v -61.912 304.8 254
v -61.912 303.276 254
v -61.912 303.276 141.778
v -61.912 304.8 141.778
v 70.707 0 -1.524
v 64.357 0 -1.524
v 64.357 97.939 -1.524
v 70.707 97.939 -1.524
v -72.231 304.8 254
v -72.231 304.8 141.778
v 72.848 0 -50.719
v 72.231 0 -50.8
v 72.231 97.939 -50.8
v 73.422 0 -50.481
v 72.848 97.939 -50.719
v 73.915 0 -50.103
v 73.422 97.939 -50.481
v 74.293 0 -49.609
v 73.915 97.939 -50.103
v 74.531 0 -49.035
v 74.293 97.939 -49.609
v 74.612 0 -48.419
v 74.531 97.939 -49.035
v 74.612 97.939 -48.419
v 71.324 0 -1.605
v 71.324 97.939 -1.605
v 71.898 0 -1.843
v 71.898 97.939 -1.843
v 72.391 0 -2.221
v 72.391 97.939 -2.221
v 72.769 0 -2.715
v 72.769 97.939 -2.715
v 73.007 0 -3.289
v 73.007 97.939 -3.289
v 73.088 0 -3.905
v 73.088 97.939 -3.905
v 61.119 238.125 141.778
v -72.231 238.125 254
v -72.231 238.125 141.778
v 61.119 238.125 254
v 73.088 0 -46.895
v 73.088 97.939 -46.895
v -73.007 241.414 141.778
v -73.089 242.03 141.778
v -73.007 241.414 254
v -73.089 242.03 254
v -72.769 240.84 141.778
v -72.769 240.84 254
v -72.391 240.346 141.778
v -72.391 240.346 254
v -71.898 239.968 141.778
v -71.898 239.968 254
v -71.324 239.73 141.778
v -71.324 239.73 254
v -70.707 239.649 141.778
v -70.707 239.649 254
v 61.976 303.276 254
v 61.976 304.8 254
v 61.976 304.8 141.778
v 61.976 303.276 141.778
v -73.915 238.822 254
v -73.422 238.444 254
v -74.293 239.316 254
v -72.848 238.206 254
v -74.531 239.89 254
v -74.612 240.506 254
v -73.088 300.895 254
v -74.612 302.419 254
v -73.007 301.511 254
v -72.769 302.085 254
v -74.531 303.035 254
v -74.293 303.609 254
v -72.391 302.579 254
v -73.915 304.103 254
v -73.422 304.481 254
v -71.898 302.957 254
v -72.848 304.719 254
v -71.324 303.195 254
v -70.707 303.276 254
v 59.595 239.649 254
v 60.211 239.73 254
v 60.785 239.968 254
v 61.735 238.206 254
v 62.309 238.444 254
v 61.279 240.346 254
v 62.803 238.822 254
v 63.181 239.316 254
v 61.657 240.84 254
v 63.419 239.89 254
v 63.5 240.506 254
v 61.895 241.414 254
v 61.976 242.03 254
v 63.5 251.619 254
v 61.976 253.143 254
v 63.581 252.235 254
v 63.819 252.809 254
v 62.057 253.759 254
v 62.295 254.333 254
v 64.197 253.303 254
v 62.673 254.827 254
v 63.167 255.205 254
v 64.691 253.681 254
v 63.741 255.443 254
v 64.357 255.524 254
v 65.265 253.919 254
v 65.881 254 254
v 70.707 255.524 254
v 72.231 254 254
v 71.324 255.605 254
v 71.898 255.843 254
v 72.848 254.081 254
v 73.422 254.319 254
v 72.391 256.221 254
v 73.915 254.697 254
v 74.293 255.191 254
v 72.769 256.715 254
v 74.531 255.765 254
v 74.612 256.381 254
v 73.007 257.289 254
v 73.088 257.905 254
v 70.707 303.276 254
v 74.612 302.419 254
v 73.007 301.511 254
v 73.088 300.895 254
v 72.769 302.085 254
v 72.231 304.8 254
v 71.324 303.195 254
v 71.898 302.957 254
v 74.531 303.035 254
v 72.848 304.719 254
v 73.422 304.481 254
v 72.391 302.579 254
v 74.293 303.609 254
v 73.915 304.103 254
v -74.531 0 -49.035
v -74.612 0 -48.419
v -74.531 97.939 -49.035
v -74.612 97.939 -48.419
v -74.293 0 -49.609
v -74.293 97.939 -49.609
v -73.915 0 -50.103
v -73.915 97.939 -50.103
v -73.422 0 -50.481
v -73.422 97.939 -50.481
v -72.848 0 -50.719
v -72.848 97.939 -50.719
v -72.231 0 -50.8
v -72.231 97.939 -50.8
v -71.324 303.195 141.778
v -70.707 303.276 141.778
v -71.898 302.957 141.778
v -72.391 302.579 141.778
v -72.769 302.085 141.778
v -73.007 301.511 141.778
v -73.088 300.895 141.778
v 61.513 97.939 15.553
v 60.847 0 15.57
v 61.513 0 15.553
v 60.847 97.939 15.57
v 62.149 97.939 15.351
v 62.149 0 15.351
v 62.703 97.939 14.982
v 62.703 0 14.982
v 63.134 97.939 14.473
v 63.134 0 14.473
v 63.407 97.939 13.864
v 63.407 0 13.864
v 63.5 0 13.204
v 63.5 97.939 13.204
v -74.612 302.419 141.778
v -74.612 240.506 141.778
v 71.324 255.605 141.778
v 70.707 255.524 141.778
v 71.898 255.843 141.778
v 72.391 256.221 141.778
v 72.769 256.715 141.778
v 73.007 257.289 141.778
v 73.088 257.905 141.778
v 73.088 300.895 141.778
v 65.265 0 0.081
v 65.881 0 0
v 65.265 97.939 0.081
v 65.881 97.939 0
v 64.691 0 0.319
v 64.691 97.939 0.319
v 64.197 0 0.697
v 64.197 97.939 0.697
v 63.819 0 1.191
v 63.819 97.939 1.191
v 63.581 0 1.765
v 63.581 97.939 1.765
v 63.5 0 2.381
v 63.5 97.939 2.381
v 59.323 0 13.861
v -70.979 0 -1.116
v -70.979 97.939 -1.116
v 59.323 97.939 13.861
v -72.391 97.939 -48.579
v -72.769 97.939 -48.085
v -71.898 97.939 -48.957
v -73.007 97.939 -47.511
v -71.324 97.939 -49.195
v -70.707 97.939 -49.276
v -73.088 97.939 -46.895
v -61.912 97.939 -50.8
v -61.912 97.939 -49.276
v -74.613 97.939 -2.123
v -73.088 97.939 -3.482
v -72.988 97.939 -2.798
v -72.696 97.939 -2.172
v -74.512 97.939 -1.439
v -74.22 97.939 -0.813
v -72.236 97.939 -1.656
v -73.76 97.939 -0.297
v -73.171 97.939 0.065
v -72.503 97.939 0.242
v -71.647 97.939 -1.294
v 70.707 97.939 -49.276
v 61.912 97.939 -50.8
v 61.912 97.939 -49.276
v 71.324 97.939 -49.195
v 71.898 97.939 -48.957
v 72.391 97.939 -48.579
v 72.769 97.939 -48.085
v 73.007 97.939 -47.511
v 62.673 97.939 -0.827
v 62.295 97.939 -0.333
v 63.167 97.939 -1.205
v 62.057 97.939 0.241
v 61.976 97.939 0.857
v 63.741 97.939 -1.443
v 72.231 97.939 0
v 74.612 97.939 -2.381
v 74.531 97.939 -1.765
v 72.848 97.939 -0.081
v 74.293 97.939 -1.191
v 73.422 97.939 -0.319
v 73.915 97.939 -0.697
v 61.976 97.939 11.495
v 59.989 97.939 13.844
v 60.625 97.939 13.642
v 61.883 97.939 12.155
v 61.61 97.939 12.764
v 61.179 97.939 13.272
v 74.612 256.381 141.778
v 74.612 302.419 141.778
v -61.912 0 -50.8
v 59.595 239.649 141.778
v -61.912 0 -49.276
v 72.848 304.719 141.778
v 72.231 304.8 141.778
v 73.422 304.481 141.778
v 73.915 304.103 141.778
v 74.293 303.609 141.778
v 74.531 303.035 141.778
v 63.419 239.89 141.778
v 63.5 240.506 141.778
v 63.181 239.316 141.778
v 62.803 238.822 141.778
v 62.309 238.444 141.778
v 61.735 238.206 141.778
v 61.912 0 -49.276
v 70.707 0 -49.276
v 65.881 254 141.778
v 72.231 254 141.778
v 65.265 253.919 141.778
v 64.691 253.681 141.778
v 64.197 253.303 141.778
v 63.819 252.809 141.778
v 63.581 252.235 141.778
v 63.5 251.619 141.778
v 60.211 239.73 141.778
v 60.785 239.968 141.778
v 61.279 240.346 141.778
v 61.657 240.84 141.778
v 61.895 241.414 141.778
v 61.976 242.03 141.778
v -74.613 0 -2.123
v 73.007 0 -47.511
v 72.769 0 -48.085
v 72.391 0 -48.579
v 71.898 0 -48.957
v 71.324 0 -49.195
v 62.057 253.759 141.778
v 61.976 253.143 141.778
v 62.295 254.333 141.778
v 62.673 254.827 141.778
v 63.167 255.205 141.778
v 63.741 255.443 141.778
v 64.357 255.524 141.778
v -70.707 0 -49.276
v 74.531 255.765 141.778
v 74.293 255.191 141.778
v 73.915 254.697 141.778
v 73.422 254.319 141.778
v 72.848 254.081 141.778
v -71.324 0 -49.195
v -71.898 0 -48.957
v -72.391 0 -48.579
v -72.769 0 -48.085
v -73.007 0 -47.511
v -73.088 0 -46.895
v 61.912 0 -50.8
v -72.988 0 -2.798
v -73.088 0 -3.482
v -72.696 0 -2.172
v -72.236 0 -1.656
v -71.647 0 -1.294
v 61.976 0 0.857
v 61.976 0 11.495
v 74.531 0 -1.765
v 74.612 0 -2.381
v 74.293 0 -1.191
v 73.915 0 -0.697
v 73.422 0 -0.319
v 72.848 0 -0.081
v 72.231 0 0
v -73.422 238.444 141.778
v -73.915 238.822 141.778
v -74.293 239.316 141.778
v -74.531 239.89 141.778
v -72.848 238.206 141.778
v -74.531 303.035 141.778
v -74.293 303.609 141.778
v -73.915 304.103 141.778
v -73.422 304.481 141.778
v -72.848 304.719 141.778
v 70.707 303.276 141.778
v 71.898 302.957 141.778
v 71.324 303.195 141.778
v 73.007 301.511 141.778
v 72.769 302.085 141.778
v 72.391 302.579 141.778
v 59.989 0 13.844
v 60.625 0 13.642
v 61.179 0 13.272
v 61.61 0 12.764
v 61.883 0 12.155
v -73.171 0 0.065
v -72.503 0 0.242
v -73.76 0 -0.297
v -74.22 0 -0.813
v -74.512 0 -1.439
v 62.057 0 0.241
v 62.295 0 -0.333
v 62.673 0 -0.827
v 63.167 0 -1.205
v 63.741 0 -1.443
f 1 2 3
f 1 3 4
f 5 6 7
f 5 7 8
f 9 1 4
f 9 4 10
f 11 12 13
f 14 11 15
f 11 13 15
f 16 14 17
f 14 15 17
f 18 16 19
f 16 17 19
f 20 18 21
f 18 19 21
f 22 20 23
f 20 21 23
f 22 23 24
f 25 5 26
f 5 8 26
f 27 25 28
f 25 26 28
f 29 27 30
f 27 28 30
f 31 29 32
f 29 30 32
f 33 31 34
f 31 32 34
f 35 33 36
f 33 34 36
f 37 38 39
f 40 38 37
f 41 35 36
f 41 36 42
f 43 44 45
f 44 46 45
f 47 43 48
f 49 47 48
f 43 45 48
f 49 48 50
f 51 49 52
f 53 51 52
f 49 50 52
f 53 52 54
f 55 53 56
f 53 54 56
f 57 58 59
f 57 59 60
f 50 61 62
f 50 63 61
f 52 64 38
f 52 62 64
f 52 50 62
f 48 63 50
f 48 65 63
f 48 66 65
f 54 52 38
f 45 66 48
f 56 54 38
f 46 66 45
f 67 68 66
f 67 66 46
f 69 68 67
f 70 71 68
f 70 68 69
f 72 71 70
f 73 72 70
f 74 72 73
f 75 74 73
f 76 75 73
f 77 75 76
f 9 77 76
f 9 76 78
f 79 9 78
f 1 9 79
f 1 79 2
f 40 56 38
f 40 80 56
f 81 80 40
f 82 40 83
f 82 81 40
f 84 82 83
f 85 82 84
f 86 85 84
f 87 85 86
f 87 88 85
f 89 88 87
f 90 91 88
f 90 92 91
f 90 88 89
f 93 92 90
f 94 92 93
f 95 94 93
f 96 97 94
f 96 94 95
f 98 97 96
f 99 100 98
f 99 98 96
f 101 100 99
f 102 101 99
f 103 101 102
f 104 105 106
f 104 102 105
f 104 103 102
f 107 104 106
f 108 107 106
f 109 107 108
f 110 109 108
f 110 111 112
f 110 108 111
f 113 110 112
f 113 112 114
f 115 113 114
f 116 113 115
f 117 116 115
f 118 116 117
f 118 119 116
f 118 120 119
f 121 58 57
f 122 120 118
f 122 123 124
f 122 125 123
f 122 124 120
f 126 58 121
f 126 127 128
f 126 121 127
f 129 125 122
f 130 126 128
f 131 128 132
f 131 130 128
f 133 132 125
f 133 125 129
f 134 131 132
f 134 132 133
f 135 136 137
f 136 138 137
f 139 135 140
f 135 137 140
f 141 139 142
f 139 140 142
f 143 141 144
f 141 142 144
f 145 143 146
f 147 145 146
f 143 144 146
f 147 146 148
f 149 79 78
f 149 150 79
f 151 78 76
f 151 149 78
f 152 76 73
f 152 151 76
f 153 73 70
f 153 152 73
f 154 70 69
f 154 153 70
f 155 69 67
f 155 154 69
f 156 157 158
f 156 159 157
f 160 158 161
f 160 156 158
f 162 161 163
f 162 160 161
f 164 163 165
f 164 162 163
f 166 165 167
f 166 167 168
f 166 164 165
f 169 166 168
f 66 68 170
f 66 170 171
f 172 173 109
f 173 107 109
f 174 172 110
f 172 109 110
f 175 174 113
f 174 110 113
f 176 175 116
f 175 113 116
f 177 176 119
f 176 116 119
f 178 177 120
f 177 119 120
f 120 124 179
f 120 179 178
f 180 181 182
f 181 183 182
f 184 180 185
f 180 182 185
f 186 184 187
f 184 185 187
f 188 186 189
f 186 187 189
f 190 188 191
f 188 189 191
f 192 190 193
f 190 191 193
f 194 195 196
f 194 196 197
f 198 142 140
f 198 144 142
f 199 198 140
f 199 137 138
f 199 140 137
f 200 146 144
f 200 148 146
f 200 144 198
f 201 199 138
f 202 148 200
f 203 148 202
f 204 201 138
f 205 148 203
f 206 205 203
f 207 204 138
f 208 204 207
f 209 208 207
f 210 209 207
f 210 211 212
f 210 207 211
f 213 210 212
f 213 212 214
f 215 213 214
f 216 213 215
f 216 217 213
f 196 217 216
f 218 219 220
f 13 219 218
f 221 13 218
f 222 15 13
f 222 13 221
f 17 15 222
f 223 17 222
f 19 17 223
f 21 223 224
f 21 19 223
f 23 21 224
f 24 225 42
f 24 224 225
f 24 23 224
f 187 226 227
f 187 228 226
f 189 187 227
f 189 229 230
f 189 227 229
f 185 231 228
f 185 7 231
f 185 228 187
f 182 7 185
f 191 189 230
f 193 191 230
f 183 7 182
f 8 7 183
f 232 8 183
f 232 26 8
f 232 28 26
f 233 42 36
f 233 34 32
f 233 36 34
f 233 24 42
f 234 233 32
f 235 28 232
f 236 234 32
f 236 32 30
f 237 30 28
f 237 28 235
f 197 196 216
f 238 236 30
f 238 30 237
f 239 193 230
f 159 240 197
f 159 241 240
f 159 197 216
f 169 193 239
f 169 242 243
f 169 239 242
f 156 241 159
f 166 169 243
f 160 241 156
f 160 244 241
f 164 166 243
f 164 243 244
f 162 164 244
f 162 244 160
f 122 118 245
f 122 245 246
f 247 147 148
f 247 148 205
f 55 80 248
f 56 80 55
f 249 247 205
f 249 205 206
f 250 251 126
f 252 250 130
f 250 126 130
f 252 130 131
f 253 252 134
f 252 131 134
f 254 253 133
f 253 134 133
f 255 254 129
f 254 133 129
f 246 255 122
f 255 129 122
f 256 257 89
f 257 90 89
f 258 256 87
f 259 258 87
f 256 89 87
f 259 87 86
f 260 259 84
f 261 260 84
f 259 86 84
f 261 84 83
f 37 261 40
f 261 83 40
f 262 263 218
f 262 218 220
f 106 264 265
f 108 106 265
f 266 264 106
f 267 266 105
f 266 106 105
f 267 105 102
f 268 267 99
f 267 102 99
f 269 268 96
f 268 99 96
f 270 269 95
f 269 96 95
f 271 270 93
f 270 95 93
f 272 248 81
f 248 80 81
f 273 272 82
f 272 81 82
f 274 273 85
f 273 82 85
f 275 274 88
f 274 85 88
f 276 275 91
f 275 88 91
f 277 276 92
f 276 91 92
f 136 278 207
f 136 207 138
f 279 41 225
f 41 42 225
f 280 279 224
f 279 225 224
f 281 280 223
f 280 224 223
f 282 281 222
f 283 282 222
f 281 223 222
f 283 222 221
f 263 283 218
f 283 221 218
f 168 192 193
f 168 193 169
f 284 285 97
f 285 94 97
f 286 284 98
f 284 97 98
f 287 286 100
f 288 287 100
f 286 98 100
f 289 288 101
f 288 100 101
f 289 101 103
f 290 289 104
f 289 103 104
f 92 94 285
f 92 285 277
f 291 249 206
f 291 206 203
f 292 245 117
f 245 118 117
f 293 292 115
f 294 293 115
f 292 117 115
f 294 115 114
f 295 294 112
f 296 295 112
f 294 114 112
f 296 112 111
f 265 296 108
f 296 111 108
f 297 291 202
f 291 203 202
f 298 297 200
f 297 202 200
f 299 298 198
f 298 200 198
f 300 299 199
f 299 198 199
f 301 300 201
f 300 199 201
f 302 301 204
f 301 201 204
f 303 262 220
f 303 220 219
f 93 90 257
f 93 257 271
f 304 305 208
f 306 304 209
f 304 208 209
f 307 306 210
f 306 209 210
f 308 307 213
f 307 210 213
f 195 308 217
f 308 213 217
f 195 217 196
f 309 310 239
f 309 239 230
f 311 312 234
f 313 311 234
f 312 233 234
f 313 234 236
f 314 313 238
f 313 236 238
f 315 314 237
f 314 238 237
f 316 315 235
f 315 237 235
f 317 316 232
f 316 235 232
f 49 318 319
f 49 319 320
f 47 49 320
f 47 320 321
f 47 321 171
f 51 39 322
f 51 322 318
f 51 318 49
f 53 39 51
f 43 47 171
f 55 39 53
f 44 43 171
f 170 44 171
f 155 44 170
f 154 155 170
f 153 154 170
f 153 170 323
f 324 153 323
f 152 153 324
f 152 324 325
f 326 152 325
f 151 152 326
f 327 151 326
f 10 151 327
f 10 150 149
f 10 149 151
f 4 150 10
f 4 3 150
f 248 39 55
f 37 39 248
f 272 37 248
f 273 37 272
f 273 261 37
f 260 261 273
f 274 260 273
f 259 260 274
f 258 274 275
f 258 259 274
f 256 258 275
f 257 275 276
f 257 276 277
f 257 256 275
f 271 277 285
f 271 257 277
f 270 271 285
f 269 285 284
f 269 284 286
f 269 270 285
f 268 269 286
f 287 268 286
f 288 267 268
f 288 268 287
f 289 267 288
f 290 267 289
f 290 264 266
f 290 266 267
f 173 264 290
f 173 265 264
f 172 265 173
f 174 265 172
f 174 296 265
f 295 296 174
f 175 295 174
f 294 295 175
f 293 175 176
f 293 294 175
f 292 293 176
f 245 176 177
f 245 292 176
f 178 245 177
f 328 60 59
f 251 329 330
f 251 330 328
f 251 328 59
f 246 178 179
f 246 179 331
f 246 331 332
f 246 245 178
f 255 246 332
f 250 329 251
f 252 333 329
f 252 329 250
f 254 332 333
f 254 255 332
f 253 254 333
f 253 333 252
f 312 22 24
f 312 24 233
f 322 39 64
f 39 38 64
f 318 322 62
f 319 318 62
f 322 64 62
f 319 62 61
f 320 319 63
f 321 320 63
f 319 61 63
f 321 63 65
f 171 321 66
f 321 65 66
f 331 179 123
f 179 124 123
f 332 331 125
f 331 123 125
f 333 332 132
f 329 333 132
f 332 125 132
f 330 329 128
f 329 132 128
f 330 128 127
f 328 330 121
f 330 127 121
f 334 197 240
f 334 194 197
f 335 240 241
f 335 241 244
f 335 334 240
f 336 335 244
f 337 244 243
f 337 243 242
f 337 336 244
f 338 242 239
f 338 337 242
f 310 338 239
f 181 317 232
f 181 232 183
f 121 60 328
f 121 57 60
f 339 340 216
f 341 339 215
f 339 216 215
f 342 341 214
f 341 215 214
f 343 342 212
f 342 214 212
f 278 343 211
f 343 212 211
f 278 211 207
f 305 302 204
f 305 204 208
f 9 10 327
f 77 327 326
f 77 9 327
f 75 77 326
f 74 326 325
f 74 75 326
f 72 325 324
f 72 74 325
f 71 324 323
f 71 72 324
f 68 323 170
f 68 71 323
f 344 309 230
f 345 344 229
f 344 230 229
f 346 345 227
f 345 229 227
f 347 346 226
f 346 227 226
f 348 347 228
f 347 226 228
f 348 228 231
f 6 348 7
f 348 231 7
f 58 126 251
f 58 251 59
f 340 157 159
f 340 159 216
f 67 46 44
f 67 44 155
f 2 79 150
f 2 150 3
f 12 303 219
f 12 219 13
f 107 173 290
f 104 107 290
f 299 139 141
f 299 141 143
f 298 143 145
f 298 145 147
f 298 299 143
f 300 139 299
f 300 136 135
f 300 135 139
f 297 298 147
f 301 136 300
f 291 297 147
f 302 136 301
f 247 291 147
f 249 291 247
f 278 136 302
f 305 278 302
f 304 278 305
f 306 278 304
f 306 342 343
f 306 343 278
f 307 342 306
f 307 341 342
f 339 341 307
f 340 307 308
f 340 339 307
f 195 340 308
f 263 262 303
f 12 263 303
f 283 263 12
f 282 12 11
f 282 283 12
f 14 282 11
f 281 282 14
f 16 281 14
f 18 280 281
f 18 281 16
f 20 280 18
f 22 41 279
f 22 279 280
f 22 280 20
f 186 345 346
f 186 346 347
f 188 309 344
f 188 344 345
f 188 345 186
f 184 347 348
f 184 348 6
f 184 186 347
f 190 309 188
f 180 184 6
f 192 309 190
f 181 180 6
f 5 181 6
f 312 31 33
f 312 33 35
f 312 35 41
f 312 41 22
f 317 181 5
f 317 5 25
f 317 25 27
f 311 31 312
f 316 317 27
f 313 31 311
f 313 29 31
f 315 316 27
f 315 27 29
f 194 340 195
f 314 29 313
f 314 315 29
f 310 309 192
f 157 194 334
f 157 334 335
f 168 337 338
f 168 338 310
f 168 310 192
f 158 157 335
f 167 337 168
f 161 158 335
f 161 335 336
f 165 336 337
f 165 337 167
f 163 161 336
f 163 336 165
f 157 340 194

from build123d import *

# Parameters (mm, degrees)
F1_DEPTH       = 304.8
F3_DEPTH       = 254
F3_DEPTH_BACK  = 50.8
F6_DEPTH       = 15.875
F8_DEPTH       = 66.676
F11_W          = 2.1258684099
F11_H          = 0.0508
F12_DEPTH      = 254.001
F13_W          = 299.0930452943
F13_H          = 280.027359724
F14_DEPTH      = 74.6135
F14_DEPTH_BACK = 74.6135
F15_R          = 2.38125
F16_R          = 2.38125


# Not quite as in the source:
# - a feature of the source that left no trace in its solid (it failed there, or was rolled back) is left out


with BuildPart() as f1:
    # F0 (on Front) → F1 (new body)
    with BuildSketch(Plane.XZ):
        Polygon((-74.6125, -50.8), (-61.9125, -50.8), (-61.9125, -49.276), (-73.0885, -49.276), (-73.0885, -1.3588619322), (61.976, 14.1657932403), (61.976, -1.524), (73.0885, -1.524), (73.0885, -49.276), (61.9125, -49.276), (61.9125, -50.8), (74.6125, -50.8), (74.6125, 0), (63.5, 0), (63.5, 15.875), (-74.6125, 0), align=None)
    extrude(amount=-F1_DEPTH)


with BuildPart() as f3:
    # F2 (on Top) → F3 (new body, two sides)
    with BuildSketch(Plane.XY) as f3_sk:
        Polygon((-61.9125, 304.8), (-74.6125, 304.8), (-74.6125, 238.125), (63.5, 238.125), (63.5, 254), (74.6125, 254), (74.6125, 304.8), (61.976, 304.8), (61.976, 303.276), (73.0885, 303.276), (73.0885, 255.524), (61.976, 255.524), (61.976, 239.649), (-73.0885, 239.649), (-73.0885, 303.276), (-61.9125, 303.276), align=None)
    extrude(amount=F3_DEPTH)
    extrude(f3_sk.sketch, amount=-F3_DEPTH_BACK)


with BuildPart() as f6_tool:
    # F5 (on face) → F6 (new body, through all)
    with BuildSketch(Plane.XZ.offset(-238.125)):
        Polygon((61.976, 14.1657932403), (-73.0885, -1.3588619322), (-91.1419016793, -3.4339655735), (-91.1419016793, -71.0971727967), (86.3244011998, -71.0971727967), (86.3244011998, 0), (61.976, 0), align=None)
    extrude(amount=-F6_DEPTH)


with BuildPart() as f1_1:
    add(f1.part)

    # F6: cut by f6_tool
    add(f6_tool.part, mode=Mode.SUBTRACT)


with BuildPart() as f3_1:
    add(f3.part)

    # F6: cut by f6_tool
    add(f6_tool.part, mode=Mode.SUBTRACT)


with BuildPart() as f8_tool:
    # F7 (on face) → F8 (new body, through all)
    with BuildSketch(Plane.XZ.offset(-238.125)):
        Polygon((-74.6125, 0), (-74.6125, -1.5340343459), (61.976, 14.1657932403), (61.976, 0), (63.5, 0), (63.5, 15.875), align=None)
    extrude(amount=-F8_DEPTH)


with BuildPart() as f1_2:
    add(f1_1.part)

    # F8: cut by f8_tool
    add(f8_tool.part, mode=Mode.SUBTRACT)


with BuildPart() as f3_2:
    add(f3_1.part)

    # F8: cut by f8_tool
    add(f8_tool.part, mode=Mode.SUBTRACT)


with BuildPart() as f1_3:
    add(f1_2.part)

    # F10: union F3
    add(f3_2.part)

    # F11 (on face) → F12 (cut, through all)
    with BuildSketch(Plane.XY):
        with Locations((62.4370657951, 238.0996)):
            Rectangle(F11_W, F11_H)
    extrude(amount=F12_DEPTH, mode=Mode.SUBTRACT)

    # F13 (on Right) → F14 (cut, two sides)
    with BuildSketch(Plane.YZ) as f14_sk:
        with Locations((247.4853210151, 1.7642229795)):
            Rectangle(F13_W, F13_H)
    extrude(amount=-F14_DEPTH, mode=Mode.SUBTRACT)
    extrude(f14_sk.sketch, amount=F14_DEPTH_BACK, mode=Mode.SUBTRACT)

    # F15
    f15_edges = [f1_3.edges().sort_by_distance(p)[0] for p in [
        (-73.0885, 239.649, 197.888951),
        (-74.6125, 238.125, 197.888951),
        (-74.6125, 304.8, 197.888951),
        (-73.0885, 303.276, 197.888951),
        (61.976, 239.649, 197.888951),
        (61.976, 255.524, 197.888951),
        (73.0885, 255.524, 197.888951),
        (73.0885, 303.276, 197.888951),
        (63.5, 238.125, 197.888951),
        (63.5, 254, 197.888951),
        (74.6125, 254, 197.888951),
        (74.6125, 304.8, 197.888951),
    ]]
    fillet(f15_edges, radius=F15_R)

    # F16
    f16_edges = [f1_3.edges().sort_by_distance(p)[0] for p in [
        (-73.0885, 48.969399, -49.276),
        (-73.0885, 48.969399, -1.358862),
        (61.976, 48.969399, 14.165793),
        (61.976, 48.969399, -1.524),
        (73.0885, 48.969399, -1.524),
        (73.0885, 48.969399, -49.276),
        (74.6125, 48.969399, -50.8),
        (74.6125, 48.969399, 0),
        (63.5, 48.969399, 15.875),
        (-74.6125, 48.969399, 0),
        (-74.6125, 48.969399, -50.8),
        (63.5, 48.969399, 0),
    ]]
    fillet(f16_edges, radius=F16_R)


solid = f1_3.part
